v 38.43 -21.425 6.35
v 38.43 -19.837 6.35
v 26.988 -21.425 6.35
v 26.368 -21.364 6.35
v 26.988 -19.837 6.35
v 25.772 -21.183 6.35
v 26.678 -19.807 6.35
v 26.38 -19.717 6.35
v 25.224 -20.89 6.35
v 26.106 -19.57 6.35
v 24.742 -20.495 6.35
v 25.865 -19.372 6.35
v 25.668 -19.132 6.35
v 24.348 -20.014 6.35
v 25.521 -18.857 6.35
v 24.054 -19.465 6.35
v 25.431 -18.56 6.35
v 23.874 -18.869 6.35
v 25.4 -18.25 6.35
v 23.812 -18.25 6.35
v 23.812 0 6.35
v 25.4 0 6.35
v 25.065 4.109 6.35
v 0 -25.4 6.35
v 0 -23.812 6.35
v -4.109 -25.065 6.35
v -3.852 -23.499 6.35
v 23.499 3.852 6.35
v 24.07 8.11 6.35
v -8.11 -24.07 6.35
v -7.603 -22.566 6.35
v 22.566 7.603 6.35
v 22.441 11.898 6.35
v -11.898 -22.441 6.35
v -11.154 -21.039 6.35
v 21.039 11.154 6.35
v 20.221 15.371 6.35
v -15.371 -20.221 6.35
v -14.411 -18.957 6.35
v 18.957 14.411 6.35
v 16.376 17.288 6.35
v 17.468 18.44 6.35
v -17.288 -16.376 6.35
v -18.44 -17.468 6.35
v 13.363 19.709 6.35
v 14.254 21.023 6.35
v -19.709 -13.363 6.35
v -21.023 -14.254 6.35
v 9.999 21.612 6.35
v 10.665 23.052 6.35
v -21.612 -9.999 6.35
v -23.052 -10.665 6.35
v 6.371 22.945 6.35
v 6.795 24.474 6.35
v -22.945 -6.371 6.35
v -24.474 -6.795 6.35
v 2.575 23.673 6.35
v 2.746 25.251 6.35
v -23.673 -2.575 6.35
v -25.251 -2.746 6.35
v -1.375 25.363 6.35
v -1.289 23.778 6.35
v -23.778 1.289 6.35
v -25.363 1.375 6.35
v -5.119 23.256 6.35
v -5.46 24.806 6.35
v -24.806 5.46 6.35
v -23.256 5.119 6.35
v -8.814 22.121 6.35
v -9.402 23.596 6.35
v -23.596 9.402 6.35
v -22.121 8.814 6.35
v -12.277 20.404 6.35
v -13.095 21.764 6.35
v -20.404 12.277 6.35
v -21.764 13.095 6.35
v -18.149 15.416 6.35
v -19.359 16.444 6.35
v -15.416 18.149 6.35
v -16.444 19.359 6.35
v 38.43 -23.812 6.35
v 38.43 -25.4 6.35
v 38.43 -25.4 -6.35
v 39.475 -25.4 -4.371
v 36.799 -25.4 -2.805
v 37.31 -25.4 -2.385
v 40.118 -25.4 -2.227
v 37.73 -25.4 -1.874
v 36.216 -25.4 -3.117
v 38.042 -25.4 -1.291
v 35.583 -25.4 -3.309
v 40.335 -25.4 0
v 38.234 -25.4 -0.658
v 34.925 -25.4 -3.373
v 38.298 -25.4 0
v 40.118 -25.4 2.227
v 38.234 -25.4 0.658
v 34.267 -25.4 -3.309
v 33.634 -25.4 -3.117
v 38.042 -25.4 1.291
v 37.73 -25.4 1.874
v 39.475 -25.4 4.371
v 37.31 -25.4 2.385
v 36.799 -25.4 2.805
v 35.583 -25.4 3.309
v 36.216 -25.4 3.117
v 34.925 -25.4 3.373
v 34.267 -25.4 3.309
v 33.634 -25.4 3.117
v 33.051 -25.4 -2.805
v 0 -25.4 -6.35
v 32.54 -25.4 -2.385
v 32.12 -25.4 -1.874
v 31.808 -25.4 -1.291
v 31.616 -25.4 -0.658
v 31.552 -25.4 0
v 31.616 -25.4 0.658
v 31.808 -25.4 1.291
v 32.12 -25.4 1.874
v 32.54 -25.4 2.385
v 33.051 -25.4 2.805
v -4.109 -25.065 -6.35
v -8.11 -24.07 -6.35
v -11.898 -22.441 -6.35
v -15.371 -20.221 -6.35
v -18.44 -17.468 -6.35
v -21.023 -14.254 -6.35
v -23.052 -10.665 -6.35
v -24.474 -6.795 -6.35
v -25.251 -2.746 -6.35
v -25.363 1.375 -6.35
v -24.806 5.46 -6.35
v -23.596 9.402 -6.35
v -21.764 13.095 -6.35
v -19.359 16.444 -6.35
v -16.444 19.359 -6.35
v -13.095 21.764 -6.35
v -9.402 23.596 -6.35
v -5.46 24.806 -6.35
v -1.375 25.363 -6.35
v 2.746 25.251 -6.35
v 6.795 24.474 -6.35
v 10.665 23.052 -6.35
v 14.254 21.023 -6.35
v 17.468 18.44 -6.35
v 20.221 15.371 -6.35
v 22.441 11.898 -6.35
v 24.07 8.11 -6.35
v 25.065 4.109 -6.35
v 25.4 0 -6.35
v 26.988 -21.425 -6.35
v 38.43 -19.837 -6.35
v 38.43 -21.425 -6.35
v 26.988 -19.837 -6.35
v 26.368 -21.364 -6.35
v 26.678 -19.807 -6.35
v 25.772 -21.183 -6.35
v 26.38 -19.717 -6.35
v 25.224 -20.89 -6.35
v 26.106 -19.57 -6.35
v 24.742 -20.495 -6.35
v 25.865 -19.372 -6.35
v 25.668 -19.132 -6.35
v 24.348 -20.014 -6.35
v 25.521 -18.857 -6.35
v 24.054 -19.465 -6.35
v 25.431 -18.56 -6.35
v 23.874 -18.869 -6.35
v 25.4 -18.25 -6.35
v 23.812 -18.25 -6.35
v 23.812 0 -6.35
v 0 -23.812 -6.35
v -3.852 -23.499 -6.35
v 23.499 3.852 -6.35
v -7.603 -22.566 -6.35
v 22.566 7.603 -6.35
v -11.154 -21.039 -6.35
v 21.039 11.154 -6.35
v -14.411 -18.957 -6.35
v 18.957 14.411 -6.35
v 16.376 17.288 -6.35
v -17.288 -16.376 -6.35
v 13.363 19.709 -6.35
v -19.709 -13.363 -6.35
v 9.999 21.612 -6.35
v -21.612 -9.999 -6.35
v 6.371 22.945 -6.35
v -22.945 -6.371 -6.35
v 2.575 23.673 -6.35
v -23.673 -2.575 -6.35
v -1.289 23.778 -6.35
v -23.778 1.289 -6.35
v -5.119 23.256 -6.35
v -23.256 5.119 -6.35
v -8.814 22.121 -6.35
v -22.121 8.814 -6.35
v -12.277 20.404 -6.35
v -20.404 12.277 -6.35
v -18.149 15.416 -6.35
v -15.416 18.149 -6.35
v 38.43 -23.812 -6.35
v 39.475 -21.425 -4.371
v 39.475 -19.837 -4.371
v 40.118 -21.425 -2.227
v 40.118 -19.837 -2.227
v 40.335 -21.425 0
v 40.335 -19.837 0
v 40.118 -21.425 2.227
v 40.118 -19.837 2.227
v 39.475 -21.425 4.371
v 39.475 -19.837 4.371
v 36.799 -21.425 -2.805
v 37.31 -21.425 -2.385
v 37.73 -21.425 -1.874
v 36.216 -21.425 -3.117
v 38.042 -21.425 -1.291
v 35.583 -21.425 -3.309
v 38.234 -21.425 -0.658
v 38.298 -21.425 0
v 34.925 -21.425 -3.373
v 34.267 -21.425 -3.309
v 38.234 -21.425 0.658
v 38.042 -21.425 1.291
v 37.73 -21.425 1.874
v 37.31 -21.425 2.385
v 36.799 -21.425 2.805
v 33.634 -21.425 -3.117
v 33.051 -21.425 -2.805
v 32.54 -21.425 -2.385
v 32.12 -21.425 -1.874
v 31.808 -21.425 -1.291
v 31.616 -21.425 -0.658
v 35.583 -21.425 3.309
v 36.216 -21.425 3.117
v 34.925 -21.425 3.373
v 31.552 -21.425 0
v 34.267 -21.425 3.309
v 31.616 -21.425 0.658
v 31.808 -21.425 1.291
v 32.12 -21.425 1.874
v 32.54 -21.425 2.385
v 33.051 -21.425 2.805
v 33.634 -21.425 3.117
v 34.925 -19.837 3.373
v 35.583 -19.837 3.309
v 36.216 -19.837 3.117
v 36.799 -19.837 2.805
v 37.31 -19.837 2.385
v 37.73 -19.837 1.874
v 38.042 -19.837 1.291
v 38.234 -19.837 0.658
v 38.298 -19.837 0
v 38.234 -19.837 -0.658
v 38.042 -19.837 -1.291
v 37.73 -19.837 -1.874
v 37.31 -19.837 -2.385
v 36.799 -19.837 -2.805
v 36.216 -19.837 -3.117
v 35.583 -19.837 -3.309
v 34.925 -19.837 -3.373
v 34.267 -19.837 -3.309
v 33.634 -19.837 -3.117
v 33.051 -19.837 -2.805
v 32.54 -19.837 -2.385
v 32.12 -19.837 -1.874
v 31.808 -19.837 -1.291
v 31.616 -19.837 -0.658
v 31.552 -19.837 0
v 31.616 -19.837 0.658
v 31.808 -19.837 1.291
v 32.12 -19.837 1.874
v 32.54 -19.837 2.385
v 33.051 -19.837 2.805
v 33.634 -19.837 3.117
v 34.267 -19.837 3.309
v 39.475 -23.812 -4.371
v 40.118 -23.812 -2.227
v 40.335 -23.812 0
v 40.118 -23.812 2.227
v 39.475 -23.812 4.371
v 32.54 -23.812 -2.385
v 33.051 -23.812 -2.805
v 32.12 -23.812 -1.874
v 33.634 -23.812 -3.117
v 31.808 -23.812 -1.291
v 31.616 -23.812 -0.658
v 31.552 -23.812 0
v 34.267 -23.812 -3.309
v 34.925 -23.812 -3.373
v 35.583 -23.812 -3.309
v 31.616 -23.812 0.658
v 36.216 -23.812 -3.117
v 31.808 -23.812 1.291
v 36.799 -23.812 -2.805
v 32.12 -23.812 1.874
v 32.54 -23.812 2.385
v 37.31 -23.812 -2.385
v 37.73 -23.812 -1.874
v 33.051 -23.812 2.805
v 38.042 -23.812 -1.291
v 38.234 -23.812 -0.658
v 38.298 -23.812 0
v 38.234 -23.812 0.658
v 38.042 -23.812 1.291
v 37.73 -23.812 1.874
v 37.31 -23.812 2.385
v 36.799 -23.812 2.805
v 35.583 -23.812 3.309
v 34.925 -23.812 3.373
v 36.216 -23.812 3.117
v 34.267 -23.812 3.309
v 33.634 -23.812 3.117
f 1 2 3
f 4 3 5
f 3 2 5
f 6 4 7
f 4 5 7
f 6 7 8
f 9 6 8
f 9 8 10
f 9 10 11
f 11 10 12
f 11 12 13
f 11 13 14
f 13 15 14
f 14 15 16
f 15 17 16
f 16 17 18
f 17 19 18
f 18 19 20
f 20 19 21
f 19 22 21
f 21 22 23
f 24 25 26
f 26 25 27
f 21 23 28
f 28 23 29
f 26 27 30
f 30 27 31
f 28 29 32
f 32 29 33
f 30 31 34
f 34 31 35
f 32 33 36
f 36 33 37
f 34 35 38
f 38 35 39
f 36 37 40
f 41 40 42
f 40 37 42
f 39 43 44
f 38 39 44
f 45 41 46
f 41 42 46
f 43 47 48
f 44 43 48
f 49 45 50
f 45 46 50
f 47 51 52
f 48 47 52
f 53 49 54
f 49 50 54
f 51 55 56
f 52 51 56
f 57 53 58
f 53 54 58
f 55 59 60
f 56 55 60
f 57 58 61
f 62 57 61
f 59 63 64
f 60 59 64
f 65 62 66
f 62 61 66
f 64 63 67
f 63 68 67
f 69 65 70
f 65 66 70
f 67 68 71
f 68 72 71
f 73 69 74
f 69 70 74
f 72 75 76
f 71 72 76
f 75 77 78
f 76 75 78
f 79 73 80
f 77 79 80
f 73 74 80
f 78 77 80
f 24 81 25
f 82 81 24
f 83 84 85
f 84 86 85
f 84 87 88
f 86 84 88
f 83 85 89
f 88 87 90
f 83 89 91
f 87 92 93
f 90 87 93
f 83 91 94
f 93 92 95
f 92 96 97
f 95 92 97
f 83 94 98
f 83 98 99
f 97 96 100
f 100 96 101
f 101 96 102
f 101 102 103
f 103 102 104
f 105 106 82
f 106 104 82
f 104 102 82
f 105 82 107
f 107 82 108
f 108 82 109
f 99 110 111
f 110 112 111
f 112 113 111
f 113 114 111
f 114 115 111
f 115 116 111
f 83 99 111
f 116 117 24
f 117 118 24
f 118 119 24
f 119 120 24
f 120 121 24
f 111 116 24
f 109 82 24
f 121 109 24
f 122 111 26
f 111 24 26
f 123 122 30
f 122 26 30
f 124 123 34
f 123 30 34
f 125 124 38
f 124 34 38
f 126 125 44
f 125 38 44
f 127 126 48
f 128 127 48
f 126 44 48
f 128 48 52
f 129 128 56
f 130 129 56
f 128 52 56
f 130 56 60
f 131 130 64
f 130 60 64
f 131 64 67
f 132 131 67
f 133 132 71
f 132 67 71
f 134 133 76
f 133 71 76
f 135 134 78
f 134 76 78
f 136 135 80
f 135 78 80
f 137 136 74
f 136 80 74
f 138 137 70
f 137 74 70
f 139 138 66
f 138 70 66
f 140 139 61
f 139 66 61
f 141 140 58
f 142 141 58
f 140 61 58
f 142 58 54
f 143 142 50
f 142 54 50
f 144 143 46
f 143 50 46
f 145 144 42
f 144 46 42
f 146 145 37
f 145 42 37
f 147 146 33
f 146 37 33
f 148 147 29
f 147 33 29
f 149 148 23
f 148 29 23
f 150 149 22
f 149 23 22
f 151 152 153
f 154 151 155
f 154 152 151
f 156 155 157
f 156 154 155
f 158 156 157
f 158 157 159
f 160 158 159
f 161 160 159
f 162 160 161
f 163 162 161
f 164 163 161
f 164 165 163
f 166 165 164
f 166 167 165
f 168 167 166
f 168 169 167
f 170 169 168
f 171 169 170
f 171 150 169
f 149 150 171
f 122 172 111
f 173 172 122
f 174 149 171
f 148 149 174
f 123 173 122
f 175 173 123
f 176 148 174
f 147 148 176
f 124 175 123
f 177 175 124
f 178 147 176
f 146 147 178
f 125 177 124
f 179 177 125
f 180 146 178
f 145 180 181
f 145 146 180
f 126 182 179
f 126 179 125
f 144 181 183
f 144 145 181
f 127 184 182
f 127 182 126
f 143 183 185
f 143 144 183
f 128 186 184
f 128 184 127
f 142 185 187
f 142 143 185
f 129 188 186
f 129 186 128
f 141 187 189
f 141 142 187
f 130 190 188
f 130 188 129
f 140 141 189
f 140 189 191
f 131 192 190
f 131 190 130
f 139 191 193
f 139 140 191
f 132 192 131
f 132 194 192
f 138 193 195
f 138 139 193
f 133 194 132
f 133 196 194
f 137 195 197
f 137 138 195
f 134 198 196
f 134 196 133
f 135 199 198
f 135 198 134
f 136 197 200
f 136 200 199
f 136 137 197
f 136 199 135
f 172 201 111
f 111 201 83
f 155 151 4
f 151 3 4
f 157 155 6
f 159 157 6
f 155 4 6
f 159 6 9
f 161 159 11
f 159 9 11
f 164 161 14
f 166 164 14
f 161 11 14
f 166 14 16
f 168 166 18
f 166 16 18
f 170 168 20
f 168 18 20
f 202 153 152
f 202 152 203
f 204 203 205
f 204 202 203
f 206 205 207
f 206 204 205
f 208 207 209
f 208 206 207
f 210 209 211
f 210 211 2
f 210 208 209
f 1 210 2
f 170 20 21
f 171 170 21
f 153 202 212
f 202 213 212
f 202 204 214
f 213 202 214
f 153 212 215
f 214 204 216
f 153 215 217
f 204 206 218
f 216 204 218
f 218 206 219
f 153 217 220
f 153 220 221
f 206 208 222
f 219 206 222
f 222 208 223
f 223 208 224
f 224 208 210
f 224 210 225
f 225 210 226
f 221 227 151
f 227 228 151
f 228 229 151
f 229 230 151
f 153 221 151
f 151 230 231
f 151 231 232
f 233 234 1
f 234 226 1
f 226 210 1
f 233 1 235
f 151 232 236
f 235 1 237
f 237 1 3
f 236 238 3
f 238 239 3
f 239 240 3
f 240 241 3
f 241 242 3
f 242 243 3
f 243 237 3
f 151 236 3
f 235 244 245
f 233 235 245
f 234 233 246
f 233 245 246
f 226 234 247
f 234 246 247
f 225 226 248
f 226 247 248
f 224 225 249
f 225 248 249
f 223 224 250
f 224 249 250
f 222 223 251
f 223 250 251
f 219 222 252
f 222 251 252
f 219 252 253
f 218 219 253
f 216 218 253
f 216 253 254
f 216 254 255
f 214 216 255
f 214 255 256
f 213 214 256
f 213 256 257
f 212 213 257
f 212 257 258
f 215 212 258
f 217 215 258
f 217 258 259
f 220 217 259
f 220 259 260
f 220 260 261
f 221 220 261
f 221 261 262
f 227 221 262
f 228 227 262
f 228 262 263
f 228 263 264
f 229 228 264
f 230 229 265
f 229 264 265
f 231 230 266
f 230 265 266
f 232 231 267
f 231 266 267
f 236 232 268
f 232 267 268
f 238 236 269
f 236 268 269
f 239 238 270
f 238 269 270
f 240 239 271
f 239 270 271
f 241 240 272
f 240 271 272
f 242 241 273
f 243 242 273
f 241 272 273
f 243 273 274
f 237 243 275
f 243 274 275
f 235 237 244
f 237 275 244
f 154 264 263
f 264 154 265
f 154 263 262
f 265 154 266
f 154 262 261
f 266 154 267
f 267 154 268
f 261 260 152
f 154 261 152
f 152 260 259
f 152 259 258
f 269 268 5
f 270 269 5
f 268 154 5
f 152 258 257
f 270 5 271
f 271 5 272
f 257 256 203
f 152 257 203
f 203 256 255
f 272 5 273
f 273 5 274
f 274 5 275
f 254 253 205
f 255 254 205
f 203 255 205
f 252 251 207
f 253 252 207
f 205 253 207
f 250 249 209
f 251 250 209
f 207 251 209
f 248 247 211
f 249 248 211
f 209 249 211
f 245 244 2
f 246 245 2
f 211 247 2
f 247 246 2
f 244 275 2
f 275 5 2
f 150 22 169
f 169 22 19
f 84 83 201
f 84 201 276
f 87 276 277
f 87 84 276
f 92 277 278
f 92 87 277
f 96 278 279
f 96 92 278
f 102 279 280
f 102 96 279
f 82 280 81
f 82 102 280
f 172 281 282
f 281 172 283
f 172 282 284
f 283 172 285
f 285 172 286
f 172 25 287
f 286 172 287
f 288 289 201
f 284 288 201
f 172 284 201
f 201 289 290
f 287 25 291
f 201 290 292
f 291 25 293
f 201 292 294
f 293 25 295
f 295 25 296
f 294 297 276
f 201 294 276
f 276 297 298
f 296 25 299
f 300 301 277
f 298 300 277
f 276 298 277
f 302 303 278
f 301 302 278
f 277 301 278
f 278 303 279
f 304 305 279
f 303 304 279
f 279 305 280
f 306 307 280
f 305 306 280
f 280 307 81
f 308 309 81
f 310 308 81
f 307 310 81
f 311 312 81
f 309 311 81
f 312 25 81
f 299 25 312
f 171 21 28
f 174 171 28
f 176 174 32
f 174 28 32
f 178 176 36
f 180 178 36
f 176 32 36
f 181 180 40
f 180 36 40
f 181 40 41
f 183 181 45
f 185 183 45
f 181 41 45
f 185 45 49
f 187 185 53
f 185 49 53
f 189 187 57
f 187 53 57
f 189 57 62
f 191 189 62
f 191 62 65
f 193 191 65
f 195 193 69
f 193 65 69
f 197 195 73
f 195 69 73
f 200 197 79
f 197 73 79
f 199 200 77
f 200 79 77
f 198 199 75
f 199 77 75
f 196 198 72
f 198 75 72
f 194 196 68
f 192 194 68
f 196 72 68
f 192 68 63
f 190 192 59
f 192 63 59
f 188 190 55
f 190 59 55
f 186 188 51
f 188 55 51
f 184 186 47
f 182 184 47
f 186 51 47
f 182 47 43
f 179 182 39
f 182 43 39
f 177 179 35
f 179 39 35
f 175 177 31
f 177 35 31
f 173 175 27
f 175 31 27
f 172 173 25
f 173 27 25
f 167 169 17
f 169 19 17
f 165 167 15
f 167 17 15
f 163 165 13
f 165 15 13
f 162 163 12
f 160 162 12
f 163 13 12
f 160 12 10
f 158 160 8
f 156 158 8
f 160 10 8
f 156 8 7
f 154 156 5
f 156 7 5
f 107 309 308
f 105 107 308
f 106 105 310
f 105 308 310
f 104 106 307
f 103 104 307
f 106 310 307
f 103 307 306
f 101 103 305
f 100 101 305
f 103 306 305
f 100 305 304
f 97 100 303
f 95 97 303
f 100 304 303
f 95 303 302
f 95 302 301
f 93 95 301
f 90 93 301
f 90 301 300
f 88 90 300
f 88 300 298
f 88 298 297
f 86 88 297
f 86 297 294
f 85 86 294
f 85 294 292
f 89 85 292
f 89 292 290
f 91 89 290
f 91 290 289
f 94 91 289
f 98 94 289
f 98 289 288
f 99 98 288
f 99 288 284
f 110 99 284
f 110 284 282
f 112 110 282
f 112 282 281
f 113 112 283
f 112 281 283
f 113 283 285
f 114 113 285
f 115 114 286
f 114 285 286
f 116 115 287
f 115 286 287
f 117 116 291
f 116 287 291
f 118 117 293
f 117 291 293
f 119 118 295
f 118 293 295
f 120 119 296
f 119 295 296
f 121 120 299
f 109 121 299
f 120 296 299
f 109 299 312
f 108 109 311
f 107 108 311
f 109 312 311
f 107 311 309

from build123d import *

# Parameters (mm, degrees)
BOSS_EXTRUDE1_DEPTH     = 6.35
SKETCH2_R               = 3.3734375
CUT_EXTRUDE1_DEPTH      = 49.087533302
CUT_EXTRUDE3_DEPTH      = 49.087533302
CUT_EXTRUDE3_DEPTH_BACK = 49.087533302


with BuildPart() as part:
    # Sketch1 → Boss-Extrude1 (new, symmetric)
    with BuildSketch(Plane.XY):
        with BuildLine():
            Line((0, -23.8125), (40.3352, -23.8125))
            Line((40.3352, -23.8125), (40.3352, -25.4))
            Line((40.3352, -25.4), (0, -25.4))
            ThreePointArc((0, -25.4), (-17.960512242, 17.960512242), (25.4, 0))
            Line((25.4, 0), (25.4, -18.2499))
            ThreePointArc((25.4, -18.2499), (25.864967985, -19.372432015), (26.9875, -19.8374))
            Line((26.9875, -19.8374), (40.3352, -19.8374))
            Line((40.3352, -19.8374), (40.3352, -21.4249))
            Line((40.3352, -21.4249), (26.9875, -21.4249))
            ThreePointArc((26.9875, -21.4249), (24.74243597, -20.49496403), (23.8125, -18.2499))
            Line((23.8125, -18.2499), (23.8125, 0))
            ThreePointArc((23.8125, 0), (-16.837980227, 16.837980227), (0, -23.8125))
        make_face()
    extrude(amount=BOSS_EXTRUDE1_DEPTH, both=True)

    # Sketch2 → Cut-Extrude1 (cut, through all)
    with BuildSketch(Plane(origin=(0, 0, 0), x_dir=(1, 0, 0), z_dir=(0, 1, 0))):
        with Locations((34.925, 0)):
            Circle(SKETCH2_R)
    extrude(amount=-CUT_EXTRUDE1_DEPTH, mode=Mode.SUBTRACT)

    # Sketch4 → Cut-Extrude3 (cut, two sides: drawn at the far end of the back side and taken through both)
    with BuildSketch(Plane(origin=(0, 0, 0), x_dir=(1, 0, 0), z_dir=(0, 1, 0)).offset(-CUT_EXTRUDE3_DEPTH_BACK)):
        with BuildLine():
            Line((-38.72359939, 123.366595742), (38.4302, 6.35))
            ThreePointArc((38.4302, 6.35), (40.3352, 0), (38.4302, -6.35))
            Line((38.4302, -6.35), (-38.72359939, -123.366595742))
            Line((-38.72359939, -123.366595742), (241.601871727, -123.366595742))
            Line((241.601871727, -123.366595742), (241.601871727, 123.366595742))
            Line((241.601871727, 123.366595742), (-38.72359939, 123.366595742))
        make_face()
    extrude(amount=CUT_EXTRUDE3_DEPTH + CUT_EXTRUDE3_DEPTH_BACK, mode=Mode.SUBTRACT)


solid = part.part
